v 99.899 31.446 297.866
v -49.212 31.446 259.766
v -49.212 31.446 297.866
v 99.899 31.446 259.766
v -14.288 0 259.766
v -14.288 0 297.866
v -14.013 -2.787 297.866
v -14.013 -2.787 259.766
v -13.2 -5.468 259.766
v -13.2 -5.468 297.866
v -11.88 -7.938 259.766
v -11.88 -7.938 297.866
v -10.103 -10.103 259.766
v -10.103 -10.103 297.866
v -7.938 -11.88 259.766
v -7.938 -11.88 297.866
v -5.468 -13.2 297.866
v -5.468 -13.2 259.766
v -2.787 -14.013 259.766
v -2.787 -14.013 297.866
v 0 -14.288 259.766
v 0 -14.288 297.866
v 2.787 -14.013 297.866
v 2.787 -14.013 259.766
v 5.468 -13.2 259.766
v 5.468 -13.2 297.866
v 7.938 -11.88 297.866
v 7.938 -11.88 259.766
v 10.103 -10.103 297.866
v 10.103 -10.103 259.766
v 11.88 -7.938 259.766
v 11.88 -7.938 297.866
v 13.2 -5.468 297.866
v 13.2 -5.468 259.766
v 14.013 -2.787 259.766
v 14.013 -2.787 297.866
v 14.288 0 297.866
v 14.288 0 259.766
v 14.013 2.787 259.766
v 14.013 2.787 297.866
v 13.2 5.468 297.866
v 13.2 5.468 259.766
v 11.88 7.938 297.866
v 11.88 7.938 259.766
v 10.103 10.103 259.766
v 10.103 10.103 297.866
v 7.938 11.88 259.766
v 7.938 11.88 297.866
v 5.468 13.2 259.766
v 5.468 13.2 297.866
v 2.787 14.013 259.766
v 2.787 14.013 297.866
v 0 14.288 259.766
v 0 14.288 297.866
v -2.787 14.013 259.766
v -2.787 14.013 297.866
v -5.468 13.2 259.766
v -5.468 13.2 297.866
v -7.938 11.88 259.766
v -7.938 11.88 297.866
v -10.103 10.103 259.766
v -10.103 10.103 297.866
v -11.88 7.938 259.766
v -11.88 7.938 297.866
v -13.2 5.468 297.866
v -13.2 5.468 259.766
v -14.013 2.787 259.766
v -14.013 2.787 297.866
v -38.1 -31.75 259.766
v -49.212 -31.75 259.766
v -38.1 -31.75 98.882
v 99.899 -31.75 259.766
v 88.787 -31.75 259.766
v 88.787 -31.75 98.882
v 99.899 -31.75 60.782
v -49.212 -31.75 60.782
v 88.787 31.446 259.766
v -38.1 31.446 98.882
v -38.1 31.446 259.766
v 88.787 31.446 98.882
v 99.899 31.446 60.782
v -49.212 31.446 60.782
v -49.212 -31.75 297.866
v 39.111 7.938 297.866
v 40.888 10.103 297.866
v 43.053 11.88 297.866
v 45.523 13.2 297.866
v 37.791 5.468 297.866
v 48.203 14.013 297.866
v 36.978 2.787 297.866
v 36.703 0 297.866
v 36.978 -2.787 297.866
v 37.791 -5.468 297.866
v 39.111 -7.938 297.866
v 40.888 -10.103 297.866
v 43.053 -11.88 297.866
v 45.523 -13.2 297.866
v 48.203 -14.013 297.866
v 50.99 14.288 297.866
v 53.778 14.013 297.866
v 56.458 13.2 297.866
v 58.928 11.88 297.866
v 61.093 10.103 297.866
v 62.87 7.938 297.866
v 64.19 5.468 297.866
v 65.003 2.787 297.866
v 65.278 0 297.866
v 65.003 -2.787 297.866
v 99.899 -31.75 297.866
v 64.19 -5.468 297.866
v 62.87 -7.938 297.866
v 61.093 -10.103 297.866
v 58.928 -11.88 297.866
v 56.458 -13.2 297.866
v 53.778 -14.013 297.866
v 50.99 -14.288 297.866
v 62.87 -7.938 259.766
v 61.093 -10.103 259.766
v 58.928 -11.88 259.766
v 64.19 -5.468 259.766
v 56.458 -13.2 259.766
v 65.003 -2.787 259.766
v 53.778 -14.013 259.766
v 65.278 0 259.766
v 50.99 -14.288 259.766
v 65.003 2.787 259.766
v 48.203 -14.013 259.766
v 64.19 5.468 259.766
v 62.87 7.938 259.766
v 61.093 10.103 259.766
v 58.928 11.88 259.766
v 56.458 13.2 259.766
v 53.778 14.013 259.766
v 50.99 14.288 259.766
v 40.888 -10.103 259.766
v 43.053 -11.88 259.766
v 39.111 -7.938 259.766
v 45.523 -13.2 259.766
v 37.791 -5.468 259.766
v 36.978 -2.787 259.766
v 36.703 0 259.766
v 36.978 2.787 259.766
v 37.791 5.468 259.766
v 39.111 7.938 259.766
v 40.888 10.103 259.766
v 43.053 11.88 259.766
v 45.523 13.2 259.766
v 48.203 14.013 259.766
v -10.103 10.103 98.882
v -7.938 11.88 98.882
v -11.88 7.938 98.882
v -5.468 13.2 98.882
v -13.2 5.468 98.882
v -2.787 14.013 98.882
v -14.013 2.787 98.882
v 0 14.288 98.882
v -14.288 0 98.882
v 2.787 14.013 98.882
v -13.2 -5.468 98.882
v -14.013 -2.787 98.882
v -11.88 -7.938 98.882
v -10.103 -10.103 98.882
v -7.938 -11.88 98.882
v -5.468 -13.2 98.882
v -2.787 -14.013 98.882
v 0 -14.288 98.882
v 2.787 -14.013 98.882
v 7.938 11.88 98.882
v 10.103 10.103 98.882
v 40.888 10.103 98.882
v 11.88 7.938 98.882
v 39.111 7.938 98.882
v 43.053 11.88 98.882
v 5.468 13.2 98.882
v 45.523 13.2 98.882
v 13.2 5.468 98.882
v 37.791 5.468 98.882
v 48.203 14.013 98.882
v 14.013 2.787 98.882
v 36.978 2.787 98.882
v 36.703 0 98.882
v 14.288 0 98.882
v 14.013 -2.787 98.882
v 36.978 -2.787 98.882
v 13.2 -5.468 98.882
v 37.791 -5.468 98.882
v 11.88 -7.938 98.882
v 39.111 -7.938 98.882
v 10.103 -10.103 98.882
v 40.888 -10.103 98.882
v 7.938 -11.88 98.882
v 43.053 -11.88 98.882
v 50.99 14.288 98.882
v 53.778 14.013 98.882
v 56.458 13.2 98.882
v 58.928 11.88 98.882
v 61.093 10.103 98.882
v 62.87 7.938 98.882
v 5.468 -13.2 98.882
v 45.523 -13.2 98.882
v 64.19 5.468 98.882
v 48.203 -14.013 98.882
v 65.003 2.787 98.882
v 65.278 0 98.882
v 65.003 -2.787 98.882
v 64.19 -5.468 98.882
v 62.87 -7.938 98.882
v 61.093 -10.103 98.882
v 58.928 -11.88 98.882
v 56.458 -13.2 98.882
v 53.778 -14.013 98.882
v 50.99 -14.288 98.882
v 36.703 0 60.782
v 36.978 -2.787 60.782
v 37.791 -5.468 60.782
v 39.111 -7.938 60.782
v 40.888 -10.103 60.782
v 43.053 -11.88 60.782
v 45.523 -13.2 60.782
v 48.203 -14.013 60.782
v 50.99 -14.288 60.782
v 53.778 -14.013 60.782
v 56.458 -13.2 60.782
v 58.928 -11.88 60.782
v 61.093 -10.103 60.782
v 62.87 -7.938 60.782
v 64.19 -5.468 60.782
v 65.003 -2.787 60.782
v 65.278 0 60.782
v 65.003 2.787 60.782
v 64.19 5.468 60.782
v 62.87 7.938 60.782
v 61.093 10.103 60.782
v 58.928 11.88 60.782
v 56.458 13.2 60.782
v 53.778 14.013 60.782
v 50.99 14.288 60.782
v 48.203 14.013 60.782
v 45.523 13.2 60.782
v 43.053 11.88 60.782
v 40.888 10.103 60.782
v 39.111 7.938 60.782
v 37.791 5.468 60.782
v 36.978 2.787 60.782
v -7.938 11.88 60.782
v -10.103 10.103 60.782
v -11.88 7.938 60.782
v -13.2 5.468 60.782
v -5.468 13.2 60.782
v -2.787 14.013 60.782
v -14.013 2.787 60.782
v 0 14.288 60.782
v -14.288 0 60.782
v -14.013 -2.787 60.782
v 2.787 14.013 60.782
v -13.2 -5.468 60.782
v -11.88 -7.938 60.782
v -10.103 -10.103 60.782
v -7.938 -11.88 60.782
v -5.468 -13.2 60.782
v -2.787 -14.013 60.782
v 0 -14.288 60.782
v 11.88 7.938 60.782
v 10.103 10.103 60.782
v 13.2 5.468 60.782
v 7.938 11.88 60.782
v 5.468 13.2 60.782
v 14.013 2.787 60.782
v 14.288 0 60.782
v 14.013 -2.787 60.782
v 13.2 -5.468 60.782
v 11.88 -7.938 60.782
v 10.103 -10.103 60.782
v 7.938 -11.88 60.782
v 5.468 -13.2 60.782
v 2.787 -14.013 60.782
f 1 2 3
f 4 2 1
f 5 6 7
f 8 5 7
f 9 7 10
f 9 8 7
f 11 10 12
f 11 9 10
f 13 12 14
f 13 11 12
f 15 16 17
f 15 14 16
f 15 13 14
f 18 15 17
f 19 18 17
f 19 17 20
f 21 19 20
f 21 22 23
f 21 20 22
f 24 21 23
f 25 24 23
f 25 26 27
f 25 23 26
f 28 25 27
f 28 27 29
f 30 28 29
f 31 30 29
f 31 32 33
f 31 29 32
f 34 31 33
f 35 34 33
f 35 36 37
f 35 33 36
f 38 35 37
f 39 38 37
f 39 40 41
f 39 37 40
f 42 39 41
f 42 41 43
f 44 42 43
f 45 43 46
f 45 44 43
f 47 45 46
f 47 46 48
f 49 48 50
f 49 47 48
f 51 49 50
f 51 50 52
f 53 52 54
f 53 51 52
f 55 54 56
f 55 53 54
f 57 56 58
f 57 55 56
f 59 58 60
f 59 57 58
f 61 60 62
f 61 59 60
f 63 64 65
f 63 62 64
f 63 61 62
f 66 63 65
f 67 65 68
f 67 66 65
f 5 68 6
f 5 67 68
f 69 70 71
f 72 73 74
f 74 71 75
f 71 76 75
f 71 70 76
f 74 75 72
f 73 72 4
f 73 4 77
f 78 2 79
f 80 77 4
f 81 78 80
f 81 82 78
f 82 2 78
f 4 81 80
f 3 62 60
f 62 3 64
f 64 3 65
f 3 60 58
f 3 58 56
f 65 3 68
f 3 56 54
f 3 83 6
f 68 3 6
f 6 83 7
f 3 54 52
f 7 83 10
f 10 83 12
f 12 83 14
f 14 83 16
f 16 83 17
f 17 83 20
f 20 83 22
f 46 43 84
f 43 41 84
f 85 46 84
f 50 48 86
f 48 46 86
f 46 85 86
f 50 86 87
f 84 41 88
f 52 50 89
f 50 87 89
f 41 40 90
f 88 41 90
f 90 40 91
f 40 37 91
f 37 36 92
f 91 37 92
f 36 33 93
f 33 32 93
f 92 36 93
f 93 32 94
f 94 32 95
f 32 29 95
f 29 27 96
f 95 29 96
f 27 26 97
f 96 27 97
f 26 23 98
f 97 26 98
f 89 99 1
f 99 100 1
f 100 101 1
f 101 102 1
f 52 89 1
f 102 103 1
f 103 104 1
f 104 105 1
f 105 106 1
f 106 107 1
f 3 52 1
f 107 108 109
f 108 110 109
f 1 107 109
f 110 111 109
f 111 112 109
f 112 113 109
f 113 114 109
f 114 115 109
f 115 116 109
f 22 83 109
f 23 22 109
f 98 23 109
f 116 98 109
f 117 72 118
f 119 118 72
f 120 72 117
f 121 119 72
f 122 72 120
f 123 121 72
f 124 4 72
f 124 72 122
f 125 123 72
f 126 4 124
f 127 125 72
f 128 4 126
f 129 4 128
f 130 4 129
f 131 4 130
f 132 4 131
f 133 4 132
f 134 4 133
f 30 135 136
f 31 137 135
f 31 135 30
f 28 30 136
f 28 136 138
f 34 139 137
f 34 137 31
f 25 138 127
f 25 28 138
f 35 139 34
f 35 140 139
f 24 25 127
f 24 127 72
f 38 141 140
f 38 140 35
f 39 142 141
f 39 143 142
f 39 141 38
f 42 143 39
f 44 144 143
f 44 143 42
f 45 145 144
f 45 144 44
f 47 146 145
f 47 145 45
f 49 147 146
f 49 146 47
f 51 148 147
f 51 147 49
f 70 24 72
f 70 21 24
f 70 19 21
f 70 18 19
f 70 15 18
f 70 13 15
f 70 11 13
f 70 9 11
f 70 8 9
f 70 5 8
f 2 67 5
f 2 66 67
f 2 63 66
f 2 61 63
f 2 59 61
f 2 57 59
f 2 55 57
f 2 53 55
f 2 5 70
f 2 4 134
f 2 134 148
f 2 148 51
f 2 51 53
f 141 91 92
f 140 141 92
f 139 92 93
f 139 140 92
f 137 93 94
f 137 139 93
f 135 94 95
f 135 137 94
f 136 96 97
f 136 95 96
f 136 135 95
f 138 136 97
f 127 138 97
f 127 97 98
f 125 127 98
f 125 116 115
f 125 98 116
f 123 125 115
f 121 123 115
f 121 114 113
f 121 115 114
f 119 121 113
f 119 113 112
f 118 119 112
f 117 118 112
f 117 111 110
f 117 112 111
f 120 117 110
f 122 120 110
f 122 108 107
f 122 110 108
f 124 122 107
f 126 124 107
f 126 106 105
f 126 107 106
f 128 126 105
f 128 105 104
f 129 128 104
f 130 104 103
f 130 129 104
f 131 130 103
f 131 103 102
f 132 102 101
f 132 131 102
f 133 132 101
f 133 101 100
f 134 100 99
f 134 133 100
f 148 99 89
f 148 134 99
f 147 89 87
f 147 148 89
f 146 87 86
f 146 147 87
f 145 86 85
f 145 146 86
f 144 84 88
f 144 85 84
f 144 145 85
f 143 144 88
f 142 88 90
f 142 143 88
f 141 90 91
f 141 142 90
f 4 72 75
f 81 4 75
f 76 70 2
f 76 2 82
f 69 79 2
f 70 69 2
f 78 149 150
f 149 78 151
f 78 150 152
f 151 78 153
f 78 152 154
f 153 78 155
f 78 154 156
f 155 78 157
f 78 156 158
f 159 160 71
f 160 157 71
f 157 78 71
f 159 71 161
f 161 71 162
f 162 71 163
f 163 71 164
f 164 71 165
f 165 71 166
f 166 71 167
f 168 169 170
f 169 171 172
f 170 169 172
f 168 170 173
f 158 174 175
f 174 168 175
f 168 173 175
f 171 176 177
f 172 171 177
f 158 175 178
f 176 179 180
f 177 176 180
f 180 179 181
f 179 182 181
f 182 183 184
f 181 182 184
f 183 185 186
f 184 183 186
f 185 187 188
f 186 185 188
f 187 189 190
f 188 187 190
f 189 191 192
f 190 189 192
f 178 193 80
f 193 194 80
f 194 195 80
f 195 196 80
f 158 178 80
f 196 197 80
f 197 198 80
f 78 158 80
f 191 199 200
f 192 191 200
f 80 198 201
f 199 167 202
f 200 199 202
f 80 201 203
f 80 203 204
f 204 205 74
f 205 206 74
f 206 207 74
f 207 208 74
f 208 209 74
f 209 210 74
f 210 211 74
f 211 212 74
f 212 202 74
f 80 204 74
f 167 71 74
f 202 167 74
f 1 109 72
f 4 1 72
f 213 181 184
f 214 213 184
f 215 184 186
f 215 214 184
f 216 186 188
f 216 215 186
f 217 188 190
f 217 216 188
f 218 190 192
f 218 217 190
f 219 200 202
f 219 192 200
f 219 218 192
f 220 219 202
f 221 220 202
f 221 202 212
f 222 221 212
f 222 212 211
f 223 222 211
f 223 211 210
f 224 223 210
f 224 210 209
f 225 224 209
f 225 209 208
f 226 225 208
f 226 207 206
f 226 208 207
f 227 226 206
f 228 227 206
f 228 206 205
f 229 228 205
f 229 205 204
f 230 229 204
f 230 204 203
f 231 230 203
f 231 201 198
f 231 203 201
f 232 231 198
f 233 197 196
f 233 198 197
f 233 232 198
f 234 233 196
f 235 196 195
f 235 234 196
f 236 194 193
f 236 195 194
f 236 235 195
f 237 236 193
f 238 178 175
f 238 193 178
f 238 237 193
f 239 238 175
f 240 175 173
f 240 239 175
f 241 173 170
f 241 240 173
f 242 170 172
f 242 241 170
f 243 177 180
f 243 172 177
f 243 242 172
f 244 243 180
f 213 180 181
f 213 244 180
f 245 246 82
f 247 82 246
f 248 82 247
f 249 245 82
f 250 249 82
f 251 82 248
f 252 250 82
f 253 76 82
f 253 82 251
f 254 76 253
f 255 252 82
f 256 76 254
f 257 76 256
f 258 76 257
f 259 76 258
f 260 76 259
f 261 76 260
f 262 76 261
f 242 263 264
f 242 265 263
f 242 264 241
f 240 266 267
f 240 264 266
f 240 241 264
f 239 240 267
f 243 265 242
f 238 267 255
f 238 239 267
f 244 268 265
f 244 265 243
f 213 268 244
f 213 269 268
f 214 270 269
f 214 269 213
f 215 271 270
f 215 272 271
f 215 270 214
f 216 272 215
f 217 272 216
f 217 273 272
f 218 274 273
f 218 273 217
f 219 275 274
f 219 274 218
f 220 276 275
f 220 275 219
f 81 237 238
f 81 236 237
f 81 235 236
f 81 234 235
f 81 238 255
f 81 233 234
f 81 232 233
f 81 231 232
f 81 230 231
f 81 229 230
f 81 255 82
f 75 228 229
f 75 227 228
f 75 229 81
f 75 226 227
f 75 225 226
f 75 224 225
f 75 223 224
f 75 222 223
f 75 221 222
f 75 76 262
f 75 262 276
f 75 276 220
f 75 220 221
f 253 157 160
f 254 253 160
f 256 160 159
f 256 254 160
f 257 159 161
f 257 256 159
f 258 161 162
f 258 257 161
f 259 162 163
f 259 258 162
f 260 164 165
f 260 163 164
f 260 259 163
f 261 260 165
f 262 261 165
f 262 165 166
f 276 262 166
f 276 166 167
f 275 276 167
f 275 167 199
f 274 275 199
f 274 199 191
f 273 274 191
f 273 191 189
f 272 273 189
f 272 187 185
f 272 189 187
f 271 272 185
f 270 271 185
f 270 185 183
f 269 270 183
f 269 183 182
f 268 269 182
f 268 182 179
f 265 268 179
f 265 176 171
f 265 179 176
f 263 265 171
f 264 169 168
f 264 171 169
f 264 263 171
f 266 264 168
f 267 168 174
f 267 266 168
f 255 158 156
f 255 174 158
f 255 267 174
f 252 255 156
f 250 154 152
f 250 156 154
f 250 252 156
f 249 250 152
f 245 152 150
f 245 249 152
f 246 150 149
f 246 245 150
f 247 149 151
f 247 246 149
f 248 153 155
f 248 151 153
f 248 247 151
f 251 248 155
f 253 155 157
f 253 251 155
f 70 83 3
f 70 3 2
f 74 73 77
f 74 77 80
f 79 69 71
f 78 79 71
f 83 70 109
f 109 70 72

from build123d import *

# Parameters (mm, degrees)
BOSS_EXTRUDE1_START     = -31.75
SKETCH1_W               = 149.111686737
SKETCH1_H               = 237.0836
SKETCH1_W_2             = 126.886686737
SKETCH1_H_2             = 160.8836
BOSS_EXTRUDE1_DEPTH     = 63.196186737
CUT_EXTRUDE1_DEPTH      = 260.222960788
CUT_EXTRUDE1_DEPTH_BACK = 260.222960788
SKETCH2_R               = 14.2875


with BuildPart() as part:
    # Sketch1 → Boss-Extrude1 (new body)
    with BuildSketch(Plane(origin=(0, 0, 0), x_dir=(1, 0, 0), z_dir=(0, 1, 0)).offset(BOSS_EXTRUDE1_START)):
        with Locations((25.343343369, -179.324)):
            Rectangle(SKETCH1_W, SKETCH1_H)
        with Locations((25.343343369, -179.324)):
            Rectangle(SKETCH1_W_2, SKETCH1_H_2, mode=Mode.SUBTRACT)
    extrude(amount=BOSS_EXTRUDE1_DEPTH)

    # Sketch2 → Cut-Extrude1 (cut, two sides: drawn at the far end of the back side and taken through both)
    with BuildSketch(Plane.XY.offset(297.8658).offset(-CUT_EXTRUDE1_DEPTH_BACK)):
        with Locations(Location((0, 0, 0), (0, 0, 180))):
            Circle(SKETCH2_R)
        with Locations(Location((50.9905, 0, 0), (0, 0, 180))):
            Circle(SKETCH2_R)
    extrude(amount=CUT_EXTRUDE1_DEPTH + CUT_EXTRUDE1_DEPTH_BACK, mode=Mode.SUBTRACT)


with BuildPart() as body_2:
    # Split1: the piece on the far side of the plane
    add(part.part)
    split(bisect_by=Plane(origin=(0, 0, 259.7658), x_dir=(-1, 0, 0), z_dir=(0, 0, -1)), keep=Keep.BOTTOM)


with BuildPart() as part_1:
    add(part.part)

    # Split1
    split(bisect_by=Plane(origin=(0, 0, 259.7658), x_dir=(-1, 0, 0), z_dir=(0, 0, -1)), keep=Keep.TOP)


solid = Compound([body_2.part, part_1.part])
